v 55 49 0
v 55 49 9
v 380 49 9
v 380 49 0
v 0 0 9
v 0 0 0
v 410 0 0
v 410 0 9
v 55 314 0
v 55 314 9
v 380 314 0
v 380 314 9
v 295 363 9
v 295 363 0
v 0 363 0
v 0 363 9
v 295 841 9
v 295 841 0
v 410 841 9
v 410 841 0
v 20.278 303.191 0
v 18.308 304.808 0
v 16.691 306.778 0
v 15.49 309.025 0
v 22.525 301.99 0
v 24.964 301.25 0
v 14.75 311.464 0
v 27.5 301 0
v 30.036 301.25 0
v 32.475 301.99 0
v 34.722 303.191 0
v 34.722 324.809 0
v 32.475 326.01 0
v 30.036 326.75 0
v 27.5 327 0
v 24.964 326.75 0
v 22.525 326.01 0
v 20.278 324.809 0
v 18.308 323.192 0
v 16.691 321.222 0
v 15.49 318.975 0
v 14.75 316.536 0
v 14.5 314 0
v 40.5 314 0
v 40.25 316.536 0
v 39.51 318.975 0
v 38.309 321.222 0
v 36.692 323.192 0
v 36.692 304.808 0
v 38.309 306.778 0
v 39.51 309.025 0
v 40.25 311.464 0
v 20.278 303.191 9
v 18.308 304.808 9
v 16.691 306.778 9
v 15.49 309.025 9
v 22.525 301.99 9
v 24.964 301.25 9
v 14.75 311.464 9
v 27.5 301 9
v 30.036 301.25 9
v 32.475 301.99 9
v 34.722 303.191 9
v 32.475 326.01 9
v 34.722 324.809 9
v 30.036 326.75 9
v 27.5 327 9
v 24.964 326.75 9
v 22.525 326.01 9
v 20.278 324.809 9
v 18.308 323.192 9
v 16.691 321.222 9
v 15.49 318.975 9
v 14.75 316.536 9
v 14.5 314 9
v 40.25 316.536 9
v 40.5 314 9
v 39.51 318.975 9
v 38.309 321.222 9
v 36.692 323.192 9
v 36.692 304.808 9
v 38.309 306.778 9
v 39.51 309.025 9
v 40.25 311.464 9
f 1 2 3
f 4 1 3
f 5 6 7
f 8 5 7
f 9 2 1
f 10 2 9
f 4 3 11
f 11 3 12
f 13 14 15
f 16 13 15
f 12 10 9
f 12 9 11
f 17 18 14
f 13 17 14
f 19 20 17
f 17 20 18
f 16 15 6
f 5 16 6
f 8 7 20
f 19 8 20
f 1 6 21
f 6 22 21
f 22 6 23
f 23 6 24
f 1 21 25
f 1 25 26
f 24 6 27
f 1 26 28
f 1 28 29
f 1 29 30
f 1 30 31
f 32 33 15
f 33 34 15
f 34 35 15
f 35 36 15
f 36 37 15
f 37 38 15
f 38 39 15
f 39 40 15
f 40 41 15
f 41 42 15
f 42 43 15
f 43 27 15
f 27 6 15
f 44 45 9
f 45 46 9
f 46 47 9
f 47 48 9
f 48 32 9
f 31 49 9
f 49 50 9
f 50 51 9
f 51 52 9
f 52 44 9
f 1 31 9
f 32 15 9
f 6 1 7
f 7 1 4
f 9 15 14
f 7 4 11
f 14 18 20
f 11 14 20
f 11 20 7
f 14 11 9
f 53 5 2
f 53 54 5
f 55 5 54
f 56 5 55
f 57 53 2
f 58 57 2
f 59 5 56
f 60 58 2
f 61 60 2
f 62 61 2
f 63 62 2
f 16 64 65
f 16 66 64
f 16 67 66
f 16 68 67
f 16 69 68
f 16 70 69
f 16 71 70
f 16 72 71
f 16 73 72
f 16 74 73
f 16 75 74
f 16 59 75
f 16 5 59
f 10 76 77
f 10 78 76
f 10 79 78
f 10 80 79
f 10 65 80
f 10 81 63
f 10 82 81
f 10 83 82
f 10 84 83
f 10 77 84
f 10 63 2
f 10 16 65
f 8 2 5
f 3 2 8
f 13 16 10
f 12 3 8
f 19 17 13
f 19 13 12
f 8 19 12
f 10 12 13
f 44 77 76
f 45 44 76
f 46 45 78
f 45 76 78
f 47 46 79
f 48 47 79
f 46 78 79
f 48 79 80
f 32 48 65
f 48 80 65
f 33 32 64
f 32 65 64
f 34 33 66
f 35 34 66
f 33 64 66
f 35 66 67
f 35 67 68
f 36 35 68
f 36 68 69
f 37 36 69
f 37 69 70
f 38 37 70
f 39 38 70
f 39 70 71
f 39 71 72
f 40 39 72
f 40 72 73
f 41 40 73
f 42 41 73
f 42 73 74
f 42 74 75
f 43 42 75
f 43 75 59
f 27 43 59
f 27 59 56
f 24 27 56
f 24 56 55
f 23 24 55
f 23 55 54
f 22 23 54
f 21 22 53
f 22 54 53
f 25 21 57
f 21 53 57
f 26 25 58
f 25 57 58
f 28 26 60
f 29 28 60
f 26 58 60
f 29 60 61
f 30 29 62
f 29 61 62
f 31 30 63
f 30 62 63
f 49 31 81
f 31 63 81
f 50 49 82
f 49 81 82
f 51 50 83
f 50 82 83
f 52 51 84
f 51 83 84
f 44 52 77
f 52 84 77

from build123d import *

# Parameters (mm, degrees)
F1_DEPTH = 9
F2_W     = 325
F2_H     = 265
F2_R     = 13
F3_DEPTH = 25


with BuildPart() as f1:
    # F0 (on Top) → F1 (new body)
    with BuildSketch(Plane.XY):
        Polygon((410, 0), (410, 841), (295, 841), (295, 363), (0, 363), (0, 0), align=None)
    extrude(amount=F1_DEPTH)

    # F2 (on face) → F3 (cut)
    with BuildSketch(Plane.XY.offset(9)):
        with Locations((217.5, 181.5)):
            Rectangle(F2_W, F2_H)
        with Locations((27.5, 314)):
            Circle(F2_R)
    extrude(amount=-F3_DEPTH, mode=Mode.SUBTRACT)


solid = f1.part
